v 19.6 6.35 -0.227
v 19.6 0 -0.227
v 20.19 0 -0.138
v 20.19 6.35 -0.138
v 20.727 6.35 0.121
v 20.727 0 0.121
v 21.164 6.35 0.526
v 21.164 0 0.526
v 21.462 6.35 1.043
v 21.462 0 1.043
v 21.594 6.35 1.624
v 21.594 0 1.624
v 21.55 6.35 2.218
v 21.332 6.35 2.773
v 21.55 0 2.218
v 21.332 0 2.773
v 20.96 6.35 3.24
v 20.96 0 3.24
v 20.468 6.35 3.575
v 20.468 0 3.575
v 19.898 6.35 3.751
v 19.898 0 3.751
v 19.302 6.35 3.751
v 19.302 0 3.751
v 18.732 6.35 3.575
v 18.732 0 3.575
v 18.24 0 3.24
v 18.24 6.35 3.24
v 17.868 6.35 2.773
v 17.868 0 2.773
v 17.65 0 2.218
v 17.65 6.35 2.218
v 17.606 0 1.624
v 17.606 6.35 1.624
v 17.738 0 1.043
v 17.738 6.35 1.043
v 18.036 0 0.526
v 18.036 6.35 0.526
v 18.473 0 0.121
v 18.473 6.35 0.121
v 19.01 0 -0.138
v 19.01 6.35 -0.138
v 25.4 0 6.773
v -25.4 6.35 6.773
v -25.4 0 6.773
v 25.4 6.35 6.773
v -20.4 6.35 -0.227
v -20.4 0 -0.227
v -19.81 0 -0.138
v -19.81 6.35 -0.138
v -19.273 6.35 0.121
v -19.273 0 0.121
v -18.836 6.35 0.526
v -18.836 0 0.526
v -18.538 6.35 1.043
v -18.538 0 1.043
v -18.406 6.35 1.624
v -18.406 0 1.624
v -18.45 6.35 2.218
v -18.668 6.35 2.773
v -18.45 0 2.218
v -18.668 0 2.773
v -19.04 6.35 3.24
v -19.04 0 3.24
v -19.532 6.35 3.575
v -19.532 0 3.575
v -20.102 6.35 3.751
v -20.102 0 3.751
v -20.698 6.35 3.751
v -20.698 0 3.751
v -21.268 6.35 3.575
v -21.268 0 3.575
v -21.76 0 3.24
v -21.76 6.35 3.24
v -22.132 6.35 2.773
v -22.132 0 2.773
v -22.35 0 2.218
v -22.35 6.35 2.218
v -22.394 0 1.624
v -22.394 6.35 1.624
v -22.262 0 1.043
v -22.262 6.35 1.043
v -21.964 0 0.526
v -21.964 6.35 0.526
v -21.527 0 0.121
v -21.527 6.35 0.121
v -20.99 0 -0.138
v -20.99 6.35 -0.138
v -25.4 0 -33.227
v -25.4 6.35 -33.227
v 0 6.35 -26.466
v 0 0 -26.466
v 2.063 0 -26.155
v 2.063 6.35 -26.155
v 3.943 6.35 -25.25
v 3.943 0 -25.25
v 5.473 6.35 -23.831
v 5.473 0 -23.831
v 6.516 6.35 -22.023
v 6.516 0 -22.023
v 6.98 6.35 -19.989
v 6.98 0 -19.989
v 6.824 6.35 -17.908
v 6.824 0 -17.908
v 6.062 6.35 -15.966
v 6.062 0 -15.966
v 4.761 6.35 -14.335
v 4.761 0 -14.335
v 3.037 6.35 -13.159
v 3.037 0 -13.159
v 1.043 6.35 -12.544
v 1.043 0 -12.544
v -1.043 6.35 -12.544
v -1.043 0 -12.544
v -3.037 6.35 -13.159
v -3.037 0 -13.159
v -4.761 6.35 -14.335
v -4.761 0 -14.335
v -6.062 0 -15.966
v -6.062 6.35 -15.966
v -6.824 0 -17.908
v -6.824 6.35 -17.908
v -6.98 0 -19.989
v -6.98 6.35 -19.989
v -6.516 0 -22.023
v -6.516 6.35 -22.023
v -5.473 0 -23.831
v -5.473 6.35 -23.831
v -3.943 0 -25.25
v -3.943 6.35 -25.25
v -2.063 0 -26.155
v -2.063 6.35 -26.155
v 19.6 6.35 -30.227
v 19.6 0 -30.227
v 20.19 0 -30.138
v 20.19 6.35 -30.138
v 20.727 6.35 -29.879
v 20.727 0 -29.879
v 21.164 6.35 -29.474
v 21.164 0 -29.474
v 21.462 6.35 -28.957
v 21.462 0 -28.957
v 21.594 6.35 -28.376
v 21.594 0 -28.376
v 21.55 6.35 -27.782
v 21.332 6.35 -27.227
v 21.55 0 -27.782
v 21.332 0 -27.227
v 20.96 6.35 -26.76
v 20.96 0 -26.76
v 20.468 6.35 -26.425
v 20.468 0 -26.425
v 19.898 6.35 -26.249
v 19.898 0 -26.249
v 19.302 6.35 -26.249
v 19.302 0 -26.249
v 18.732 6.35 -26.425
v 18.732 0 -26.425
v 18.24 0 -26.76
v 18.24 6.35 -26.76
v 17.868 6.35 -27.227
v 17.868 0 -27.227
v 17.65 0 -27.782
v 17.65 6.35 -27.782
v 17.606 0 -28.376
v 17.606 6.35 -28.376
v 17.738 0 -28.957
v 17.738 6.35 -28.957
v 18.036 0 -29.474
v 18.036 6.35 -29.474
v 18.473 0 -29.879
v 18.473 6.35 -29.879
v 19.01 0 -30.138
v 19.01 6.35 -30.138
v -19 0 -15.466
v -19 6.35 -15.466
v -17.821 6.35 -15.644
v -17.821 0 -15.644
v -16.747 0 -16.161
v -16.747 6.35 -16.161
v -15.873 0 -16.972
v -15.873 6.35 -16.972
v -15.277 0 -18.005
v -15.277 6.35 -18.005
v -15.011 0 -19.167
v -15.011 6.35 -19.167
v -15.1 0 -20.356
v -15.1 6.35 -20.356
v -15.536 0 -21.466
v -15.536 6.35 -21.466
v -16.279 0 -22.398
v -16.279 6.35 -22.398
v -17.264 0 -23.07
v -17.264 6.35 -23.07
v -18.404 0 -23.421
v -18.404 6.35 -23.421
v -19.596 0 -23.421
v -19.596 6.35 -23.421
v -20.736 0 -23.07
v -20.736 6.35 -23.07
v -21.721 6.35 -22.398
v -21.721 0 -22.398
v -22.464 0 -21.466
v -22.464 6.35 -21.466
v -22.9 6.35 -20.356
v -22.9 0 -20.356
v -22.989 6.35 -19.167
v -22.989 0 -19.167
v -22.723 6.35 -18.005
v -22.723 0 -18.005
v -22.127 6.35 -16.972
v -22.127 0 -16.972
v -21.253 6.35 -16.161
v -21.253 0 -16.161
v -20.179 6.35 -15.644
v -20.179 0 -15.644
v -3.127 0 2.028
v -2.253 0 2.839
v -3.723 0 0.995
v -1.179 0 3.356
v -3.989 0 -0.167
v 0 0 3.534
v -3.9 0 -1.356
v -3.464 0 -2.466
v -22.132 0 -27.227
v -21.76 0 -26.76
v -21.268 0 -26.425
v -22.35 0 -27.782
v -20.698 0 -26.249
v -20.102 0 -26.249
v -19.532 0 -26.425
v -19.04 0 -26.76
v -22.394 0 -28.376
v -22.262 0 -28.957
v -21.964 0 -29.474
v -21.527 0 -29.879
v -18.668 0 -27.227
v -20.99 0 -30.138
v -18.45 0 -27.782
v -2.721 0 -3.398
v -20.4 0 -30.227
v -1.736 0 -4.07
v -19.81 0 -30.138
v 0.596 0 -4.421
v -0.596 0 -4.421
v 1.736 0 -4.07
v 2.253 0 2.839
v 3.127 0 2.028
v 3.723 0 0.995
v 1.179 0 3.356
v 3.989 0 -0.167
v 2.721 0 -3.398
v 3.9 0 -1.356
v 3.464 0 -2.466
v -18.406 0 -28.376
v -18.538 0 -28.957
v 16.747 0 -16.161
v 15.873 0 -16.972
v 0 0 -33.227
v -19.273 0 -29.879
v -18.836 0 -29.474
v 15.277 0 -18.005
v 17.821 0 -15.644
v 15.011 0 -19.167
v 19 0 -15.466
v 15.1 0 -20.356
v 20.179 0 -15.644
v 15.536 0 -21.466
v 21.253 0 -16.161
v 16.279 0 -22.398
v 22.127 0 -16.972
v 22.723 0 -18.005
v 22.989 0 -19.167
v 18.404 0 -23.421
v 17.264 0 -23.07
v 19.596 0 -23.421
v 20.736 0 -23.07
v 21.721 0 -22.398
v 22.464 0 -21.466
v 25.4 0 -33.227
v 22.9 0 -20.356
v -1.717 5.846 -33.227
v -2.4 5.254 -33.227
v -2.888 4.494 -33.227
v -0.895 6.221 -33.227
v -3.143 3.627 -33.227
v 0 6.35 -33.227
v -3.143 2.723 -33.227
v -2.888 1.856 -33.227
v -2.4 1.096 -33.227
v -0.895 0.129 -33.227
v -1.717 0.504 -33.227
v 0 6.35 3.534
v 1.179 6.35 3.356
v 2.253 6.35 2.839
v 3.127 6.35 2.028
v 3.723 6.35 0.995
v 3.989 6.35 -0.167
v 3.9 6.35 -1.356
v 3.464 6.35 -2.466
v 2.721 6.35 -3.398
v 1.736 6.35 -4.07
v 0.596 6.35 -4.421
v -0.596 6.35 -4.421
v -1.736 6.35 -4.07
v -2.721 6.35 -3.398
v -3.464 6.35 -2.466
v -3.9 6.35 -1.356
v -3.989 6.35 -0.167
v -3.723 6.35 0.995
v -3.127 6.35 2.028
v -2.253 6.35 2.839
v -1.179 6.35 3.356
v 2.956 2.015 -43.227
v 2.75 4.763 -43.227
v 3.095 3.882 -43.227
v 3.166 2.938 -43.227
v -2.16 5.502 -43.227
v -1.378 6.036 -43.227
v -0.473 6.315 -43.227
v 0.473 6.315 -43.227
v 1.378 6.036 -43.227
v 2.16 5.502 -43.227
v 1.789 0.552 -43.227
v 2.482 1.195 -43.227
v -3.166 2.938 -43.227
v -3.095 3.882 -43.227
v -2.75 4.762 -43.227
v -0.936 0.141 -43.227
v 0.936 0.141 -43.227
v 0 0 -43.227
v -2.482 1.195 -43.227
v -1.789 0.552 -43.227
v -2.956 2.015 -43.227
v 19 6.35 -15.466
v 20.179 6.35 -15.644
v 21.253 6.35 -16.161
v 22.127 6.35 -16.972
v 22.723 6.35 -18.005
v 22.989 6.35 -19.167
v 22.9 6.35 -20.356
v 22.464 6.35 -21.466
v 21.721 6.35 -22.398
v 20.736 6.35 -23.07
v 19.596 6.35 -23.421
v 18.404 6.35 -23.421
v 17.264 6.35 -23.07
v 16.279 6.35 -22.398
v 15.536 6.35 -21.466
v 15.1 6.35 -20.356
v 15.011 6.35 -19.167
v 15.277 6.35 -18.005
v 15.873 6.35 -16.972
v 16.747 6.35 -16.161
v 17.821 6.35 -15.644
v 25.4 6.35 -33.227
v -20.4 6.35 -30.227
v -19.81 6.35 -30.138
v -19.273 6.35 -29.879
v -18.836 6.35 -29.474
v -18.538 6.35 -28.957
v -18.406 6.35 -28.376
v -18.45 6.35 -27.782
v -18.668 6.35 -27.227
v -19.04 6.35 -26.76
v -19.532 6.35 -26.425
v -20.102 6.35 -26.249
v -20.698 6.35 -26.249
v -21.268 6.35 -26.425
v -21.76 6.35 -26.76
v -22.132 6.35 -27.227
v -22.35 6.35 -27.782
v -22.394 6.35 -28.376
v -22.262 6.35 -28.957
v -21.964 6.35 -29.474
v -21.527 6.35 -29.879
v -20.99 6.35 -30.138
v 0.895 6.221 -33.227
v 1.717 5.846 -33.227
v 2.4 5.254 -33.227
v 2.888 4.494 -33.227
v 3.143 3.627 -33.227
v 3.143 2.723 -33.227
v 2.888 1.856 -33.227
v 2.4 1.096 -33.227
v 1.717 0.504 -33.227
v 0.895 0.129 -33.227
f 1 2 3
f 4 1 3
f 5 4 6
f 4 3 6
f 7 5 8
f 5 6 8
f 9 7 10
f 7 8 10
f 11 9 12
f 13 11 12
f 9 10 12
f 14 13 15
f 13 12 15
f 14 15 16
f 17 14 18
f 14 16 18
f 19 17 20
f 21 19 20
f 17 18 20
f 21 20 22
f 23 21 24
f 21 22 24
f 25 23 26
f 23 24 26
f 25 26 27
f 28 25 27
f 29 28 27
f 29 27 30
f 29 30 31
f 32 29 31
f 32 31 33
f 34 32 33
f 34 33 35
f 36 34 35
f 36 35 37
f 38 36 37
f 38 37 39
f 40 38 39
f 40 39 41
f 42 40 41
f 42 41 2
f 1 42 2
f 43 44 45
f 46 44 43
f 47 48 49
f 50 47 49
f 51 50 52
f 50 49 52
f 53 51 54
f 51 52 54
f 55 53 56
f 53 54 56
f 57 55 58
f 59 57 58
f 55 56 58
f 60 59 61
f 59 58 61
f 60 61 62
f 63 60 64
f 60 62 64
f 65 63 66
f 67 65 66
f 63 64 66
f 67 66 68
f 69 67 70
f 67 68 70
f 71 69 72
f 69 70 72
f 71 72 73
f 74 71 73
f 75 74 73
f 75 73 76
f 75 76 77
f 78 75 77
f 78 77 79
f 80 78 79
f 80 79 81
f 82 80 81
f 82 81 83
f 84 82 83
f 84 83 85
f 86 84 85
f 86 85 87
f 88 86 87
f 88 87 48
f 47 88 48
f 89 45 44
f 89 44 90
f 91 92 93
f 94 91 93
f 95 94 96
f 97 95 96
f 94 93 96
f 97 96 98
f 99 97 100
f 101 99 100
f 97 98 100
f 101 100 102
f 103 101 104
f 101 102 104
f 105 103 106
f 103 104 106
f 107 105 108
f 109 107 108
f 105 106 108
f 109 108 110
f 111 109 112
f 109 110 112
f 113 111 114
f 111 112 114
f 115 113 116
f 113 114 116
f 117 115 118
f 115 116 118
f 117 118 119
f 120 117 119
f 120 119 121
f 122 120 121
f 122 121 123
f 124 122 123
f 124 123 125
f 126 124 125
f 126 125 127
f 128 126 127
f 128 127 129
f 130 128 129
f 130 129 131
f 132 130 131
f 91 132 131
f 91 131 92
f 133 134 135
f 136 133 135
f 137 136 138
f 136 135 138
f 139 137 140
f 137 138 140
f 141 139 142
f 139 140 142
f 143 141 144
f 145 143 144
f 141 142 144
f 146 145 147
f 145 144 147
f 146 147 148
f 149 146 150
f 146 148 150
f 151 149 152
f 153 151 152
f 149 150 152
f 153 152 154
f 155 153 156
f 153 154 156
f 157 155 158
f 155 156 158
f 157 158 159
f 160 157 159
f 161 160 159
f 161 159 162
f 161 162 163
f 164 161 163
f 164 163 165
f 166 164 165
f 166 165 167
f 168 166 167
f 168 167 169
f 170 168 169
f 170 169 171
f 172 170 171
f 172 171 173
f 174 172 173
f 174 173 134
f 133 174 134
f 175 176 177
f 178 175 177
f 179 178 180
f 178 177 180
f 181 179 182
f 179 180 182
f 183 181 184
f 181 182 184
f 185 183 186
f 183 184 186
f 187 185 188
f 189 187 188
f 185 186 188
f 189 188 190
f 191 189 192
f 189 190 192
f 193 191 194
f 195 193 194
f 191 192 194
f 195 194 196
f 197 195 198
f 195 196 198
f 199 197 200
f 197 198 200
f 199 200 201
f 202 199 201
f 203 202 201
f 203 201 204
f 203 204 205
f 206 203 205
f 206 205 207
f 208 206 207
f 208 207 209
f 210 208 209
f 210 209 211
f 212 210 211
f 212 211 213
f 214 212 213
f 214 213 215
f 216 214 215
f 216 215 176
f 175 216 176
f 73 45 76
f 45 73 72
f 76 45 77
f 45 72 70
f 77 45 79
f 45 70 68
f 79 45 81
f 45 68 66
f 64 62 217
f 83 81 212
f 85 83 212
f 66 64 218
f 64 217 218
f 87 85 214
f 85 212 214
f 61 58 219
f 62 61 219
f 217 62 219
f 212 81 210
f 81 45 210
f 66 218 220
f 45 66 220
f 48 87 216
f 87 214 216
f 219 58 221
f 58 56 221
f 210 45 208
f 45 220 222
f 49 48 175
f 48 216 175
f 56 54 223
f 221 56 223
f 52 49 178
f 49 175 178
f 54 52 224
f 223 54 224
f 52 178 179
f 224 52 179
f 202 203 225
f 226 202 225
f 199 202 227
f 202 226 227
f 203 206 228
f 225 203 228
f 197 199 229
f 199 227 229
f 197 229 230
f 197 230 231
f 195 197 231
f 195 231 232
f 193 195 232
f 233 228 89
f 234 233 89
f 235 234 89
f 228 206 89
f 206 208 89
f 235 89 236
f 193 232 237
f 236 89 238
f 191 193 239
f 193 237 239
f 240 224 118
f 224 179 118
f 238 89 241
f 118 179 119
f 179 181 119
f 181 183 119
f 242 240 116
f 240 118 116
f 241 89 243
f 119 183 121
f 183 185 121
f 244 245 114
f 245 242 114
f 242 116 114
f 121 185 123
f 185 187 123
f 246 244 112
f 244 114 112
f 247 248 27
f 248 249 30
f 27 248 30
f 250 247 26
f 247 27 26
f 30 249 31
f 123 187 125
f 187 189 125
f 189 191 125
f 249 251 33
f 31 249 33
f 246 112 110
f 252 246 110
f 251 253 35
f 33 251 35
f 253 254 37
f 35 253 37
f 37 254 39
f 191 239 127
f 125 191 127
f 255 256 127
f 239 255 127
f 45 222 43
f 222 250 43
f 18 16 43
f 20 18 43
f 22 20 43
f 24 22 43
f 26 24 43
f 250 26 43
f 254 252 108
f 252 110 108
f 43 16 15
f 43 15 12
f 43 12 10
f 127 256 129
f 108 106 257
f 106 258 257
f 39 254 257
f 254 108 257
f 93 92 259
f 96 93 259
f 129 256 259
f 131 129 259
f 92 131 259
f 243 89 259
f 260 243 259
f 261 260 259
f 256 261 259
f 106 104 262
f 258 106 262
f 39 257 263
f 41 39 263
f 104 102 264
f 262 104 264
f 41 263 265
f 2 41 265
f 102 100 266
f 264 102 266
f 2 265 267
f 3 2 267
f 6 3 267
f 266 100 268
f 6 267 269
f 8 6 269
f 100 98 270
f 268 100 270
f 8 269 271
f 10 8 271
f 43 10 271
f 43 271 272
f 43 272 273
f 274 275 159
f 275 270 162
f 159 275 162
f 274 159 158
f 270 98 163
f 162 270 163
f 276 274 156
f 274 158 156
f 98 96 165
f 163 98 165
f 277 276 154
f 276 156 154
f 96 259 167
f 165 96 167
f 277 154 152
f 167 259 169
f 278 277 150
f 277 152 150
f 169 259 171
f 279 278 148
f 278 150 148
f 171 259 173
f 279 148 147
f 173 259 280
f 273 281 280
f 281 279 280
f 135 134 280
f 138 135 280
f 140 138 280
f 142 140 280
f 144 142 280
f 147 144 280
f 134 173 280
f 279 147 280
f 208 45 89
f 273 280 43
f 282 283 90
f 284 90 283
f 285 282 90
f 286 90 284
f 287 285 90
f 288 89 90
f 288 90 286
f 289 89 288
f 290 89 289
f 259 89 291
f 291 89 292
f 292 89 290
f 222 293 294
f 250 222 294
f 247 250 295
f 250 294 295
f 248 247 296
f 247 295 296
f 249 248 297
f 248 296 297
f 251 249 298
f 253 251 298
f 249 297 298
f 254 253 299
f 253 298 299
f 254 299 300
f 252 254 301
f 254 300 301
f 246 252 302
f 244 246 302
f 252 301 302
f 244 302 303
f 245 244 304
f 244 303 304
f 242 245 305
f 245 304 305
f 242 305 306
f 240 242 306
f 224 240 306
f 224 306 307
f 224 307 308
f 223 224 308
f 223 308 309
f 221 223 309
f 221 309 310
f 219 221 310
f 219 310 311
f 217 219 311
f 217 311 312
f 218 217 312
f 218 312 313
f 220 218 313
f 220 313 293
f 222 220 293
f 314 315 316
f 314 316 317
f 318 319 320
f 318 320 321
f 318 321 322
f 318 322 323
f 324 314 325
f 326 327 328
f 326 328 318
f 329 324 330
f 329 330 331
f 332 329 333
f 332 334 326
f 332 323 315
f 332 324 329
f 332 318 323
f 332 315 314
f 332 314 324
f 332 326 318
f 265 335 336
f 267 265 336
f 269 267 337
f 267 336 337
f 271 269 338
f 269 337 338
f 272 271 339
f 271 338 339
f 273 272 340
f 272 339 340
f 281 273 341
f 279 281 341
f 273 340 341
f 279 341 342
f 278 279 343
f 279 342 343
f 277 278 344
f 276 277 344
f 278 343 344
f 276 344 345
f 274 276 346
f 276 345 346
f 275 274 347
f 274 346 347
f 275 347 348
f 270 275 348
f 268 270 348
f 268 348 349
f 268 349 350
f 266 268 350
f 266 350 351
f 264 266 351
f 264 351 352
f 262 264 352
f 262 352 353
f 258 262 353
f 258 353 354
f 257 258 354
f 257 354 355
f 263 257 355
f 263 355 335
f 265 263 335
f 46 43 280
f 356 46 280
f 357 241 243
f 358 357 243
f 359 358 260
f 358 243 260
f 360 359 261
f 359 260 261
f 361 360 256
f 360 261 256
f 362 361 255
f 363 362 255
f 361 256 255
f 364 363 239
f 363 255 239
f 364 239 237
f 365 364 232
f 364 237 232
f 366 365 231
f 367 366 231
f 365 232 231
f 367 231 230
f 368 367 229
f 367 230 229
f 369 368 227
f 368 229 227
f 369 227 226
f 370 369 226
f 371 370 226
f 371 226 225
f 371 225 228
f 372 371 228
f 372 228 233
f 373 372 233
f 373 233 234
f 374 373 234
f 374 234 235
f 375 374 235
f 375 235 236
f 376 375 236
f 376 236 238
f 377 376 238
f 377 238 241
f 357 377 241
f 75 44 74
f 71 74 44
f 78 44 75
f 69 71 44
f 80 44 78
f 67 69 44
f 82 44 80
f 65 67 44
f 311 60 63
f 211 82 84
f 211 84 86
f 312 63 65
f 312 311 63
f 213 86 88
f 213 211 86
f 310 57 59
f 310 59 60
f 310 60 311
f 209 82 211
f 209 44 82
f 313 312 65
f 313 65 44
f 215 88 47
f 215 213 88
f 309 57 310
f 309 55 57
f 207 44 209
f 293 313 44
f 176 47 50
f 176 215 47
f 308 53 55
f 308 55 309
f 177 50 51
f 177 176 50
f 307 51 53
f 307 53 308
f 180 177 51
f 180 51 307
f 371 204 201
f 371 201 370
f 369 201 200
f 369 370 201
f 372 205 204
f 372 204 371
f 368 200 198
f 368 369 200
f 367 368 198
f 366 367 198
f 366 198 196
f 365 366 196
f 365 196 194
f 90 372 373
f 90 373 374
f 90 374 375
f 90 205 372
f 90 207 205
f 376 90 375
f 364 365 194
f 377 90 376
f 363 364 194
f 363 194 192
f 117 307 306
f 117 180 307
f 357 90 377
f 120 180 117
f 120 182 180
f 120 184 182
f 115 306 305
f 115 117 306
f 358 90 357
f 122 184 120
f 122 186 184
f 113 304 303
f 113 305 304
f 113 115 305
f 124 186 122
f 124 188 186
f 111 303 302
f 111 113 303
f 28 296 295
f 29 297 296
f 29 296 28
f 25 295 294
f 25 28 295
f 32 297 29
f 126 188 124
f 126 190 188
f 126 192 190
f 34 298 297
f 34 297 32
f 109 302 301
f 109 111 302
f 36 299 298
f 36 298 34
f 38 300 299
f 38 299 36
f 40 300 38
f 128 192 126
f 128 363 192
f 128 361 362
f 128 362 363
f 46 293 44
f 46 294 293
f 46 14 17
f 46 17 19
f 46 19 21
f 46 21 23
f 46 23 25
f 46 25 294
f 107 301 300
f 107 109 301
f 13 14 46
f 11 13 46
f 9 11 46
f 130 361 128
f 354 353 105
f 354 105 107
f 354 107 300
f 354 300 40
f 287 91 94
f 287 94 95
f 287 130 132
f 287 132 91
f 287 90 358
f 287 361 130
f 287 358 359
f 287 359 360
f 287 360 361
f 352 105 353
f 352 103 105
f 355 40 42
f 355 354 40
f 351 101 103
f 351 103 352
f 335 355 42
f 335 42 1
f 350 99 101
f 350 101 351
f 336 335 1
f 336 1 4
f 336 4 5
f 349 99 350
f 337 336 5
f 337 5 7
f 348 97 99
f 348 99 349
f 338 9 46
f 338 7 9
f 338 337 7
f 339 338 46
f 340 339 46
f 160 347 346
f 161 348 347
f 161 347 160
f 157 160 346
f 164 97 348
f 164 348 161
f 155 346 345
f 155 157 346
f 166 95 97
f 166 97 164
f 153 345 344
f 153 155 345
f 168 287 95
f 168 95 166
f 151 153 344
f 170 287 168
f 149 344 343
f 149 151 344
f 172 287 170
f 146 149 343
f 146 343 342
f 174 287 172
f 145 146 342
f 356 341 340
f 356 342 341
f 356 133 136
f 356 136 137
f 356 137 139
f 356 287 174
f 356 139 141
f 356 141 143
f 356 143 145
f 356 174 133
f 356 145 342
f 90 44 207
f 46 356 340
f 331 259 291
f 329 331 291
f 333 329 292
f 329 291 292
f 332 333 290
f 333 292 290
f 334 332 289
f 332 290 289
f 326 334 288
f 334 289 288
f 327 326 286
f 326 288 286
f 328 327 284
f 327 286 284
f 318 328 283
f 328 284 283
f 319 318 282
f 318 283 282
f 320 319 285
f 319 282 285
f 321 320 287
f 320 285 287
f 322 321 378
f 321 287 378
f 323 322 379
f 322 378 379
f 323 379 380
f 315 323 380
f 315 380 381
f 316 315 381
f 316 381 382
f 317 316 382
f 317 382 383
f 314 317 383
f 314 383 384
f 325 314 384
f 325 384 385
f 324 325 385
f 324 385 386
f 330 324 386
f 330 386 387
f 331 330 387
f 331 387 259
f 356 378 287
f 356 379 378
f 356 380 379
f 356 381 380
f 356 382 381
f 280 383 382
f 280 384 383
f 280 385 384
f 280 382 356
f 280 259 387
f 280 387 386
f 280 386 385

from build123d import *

# Parameters (mm, degrees)
CROQUIS1_W              = 50.8
CROQUIS1_H              = 80
SALIENTE_EXTRUIR1_DEPTH = 6.35
CROQUIS4_R              = 4
CORTAR_EXTRUIR3_DEPTH   = 48.806720239
CROQUIS5_W              = 50.8
CROQUIS5_H              = 12.7
CORTAR_EXTRUIR4_DEPTH   = 48.806720239
CROQUIS6_W              = 50.8
CROQUIS6_H              = 20.526572449
CORTAR_EXTRUIR5_DEPTH   = 10
CROQUIS7_W              = 50.8
CROQUIS7_H              = 6.773427551
CORTAR_EXTRUIR6_DEPTH   = 10
CROQUIS8_R              = 3.175
SALIENTE_EXTRUIR2_DEPTH = 10
CROQUIS9_R              = 7
CORTAR_EXTRUIR7_DEPTH   = 10
CROQUIS10_R             = 2
CORTAR_EXTRUIR8_DEPTH   = 10


with BuildPart() as part:
    # Croquis1 → Saliente-Extruir1 (new body)
    with BuildSketch(Plane(origin=(0, 0, 0), x_dir=(1, 0, 0), z_dir=(0, 1, 0))):
        Rectangle(CROQUIS1_W, CROQUIS1_H)
    extrude(amount=SALIENTE_EXTRUIR1_DEPTH)

    # Croquis4 → Cortar-Extruir3 (cut, through all)
    with BuildSketch(Plane(origin=(0, 6.35, 0), x_dir=(1, 0, 0), z_dir=(0, 1, 0))):
        with Locations(Location((-19, 19.466091849, 0), (0, 0, 270))):
            Circle(CROQUIS4_R)
        with Locations(Location((19, 19.466091849, 0), (0, 0, 270))):
            Circle(CROQUIS4_R)
        with Locations(Location((0, 0.466091849, 0), (0, 0, 270))):
            Circle(CROQUIS4_R)
    extrude(amount=-CORTAR_EXTRUIR3_DEPTH, mode=Mode.SUBTRACT)

    # Croquis5 → Cortar-Extruir4 (cut, through all)
    with BuildSketch(Plane(origin=(0, 6.35, 0), x_dir=(1, 0, 0), z_dir=(0, 1, 0))):
        with Locations((0, -33.65)):
            Rectangle(CROQUIS5_W, CROQUIS5_H)
    extrude(amount=-CORTAR_EXTRUIR4_DEPTH, mode=Mode.SUBTRACT)

    # Croquis6 → Cortar-Extruir5 (cut)
    with BuildSketch(Plane(origin=(0, 6.35, 0), x_dir=(1, 0, 0), z_dir=(0, 1, 0))):
        with Locations((0, -17.036713776)):
            Rectangle(CROQUIS6_W, CROQUIS6_H)
    extrude(amount=-CORTAR_EXTRUIR5_DEPTH, mode=Mode.SUBTRACT)

    # Croquis7 → Cortar-Extruir6 (cut)
    with BuildSketch(Plane.XZ):
        with Locations((0, -36.613286225)):
            Rectangle(CROQUIS7_W, CROQUIS7_H)
    extrude(amount=-CORTAR_EXTRUIR6_DEPTH, mode=Mode.SUBTRACT)

    # Croquis8 → Saliente-Extruir2 (add)
    with BuildSketch(Plane(origin=(0, 0, -33.226572449), x_dir=(-1, 0, 0), z_dir=(0, 0, -1))):
        with Locations(Location((0, 3.175, 0), (0, 0, 270))):
            Circle(CROQUIS8_R)
    extrude(amount=SALIENTE_EXTRUIR2_DEPTH)

    # Croquis9 → Cortar-Extruir7 (cut)
    with BuildSketch(Plane.XZ):
        with Locations(Location((0, -19.466091849, 0), (0, 0, 270))):
            Circle(CROQUIS9_R)
    extrude(amount=-CORTAR_EXTRUIR7_DEPTH, mode=Mode.SUBTRACT)

    # Croquis10 → Cortar-Extruir8 (cut)
    with BuildSketch(Plane.XZ):
        with Locations(Location((-20.4, 1.773427551, 0), (0, 0, 270))):
            Circle(CROQUIS10_R)
        with Locations(Location((19.6, 1.773427551, 0), (0, 0, 270))):
            Circle(CROQUIS10_R)
        with Locations(Location((19.6, -28.226572449, 0), (0, 0, 270))):
            Circle(CROQUIS10_R)
        with Locations(Location((-20.4, -28.226572449, 0), (0, 0, 270))):
            Circle(CROQUIS10_R)
    extrude(amount=-CORTAR_EXTRUIR8_DEPTH, mode=Mode.SUBTRACT)


solid = part.part
